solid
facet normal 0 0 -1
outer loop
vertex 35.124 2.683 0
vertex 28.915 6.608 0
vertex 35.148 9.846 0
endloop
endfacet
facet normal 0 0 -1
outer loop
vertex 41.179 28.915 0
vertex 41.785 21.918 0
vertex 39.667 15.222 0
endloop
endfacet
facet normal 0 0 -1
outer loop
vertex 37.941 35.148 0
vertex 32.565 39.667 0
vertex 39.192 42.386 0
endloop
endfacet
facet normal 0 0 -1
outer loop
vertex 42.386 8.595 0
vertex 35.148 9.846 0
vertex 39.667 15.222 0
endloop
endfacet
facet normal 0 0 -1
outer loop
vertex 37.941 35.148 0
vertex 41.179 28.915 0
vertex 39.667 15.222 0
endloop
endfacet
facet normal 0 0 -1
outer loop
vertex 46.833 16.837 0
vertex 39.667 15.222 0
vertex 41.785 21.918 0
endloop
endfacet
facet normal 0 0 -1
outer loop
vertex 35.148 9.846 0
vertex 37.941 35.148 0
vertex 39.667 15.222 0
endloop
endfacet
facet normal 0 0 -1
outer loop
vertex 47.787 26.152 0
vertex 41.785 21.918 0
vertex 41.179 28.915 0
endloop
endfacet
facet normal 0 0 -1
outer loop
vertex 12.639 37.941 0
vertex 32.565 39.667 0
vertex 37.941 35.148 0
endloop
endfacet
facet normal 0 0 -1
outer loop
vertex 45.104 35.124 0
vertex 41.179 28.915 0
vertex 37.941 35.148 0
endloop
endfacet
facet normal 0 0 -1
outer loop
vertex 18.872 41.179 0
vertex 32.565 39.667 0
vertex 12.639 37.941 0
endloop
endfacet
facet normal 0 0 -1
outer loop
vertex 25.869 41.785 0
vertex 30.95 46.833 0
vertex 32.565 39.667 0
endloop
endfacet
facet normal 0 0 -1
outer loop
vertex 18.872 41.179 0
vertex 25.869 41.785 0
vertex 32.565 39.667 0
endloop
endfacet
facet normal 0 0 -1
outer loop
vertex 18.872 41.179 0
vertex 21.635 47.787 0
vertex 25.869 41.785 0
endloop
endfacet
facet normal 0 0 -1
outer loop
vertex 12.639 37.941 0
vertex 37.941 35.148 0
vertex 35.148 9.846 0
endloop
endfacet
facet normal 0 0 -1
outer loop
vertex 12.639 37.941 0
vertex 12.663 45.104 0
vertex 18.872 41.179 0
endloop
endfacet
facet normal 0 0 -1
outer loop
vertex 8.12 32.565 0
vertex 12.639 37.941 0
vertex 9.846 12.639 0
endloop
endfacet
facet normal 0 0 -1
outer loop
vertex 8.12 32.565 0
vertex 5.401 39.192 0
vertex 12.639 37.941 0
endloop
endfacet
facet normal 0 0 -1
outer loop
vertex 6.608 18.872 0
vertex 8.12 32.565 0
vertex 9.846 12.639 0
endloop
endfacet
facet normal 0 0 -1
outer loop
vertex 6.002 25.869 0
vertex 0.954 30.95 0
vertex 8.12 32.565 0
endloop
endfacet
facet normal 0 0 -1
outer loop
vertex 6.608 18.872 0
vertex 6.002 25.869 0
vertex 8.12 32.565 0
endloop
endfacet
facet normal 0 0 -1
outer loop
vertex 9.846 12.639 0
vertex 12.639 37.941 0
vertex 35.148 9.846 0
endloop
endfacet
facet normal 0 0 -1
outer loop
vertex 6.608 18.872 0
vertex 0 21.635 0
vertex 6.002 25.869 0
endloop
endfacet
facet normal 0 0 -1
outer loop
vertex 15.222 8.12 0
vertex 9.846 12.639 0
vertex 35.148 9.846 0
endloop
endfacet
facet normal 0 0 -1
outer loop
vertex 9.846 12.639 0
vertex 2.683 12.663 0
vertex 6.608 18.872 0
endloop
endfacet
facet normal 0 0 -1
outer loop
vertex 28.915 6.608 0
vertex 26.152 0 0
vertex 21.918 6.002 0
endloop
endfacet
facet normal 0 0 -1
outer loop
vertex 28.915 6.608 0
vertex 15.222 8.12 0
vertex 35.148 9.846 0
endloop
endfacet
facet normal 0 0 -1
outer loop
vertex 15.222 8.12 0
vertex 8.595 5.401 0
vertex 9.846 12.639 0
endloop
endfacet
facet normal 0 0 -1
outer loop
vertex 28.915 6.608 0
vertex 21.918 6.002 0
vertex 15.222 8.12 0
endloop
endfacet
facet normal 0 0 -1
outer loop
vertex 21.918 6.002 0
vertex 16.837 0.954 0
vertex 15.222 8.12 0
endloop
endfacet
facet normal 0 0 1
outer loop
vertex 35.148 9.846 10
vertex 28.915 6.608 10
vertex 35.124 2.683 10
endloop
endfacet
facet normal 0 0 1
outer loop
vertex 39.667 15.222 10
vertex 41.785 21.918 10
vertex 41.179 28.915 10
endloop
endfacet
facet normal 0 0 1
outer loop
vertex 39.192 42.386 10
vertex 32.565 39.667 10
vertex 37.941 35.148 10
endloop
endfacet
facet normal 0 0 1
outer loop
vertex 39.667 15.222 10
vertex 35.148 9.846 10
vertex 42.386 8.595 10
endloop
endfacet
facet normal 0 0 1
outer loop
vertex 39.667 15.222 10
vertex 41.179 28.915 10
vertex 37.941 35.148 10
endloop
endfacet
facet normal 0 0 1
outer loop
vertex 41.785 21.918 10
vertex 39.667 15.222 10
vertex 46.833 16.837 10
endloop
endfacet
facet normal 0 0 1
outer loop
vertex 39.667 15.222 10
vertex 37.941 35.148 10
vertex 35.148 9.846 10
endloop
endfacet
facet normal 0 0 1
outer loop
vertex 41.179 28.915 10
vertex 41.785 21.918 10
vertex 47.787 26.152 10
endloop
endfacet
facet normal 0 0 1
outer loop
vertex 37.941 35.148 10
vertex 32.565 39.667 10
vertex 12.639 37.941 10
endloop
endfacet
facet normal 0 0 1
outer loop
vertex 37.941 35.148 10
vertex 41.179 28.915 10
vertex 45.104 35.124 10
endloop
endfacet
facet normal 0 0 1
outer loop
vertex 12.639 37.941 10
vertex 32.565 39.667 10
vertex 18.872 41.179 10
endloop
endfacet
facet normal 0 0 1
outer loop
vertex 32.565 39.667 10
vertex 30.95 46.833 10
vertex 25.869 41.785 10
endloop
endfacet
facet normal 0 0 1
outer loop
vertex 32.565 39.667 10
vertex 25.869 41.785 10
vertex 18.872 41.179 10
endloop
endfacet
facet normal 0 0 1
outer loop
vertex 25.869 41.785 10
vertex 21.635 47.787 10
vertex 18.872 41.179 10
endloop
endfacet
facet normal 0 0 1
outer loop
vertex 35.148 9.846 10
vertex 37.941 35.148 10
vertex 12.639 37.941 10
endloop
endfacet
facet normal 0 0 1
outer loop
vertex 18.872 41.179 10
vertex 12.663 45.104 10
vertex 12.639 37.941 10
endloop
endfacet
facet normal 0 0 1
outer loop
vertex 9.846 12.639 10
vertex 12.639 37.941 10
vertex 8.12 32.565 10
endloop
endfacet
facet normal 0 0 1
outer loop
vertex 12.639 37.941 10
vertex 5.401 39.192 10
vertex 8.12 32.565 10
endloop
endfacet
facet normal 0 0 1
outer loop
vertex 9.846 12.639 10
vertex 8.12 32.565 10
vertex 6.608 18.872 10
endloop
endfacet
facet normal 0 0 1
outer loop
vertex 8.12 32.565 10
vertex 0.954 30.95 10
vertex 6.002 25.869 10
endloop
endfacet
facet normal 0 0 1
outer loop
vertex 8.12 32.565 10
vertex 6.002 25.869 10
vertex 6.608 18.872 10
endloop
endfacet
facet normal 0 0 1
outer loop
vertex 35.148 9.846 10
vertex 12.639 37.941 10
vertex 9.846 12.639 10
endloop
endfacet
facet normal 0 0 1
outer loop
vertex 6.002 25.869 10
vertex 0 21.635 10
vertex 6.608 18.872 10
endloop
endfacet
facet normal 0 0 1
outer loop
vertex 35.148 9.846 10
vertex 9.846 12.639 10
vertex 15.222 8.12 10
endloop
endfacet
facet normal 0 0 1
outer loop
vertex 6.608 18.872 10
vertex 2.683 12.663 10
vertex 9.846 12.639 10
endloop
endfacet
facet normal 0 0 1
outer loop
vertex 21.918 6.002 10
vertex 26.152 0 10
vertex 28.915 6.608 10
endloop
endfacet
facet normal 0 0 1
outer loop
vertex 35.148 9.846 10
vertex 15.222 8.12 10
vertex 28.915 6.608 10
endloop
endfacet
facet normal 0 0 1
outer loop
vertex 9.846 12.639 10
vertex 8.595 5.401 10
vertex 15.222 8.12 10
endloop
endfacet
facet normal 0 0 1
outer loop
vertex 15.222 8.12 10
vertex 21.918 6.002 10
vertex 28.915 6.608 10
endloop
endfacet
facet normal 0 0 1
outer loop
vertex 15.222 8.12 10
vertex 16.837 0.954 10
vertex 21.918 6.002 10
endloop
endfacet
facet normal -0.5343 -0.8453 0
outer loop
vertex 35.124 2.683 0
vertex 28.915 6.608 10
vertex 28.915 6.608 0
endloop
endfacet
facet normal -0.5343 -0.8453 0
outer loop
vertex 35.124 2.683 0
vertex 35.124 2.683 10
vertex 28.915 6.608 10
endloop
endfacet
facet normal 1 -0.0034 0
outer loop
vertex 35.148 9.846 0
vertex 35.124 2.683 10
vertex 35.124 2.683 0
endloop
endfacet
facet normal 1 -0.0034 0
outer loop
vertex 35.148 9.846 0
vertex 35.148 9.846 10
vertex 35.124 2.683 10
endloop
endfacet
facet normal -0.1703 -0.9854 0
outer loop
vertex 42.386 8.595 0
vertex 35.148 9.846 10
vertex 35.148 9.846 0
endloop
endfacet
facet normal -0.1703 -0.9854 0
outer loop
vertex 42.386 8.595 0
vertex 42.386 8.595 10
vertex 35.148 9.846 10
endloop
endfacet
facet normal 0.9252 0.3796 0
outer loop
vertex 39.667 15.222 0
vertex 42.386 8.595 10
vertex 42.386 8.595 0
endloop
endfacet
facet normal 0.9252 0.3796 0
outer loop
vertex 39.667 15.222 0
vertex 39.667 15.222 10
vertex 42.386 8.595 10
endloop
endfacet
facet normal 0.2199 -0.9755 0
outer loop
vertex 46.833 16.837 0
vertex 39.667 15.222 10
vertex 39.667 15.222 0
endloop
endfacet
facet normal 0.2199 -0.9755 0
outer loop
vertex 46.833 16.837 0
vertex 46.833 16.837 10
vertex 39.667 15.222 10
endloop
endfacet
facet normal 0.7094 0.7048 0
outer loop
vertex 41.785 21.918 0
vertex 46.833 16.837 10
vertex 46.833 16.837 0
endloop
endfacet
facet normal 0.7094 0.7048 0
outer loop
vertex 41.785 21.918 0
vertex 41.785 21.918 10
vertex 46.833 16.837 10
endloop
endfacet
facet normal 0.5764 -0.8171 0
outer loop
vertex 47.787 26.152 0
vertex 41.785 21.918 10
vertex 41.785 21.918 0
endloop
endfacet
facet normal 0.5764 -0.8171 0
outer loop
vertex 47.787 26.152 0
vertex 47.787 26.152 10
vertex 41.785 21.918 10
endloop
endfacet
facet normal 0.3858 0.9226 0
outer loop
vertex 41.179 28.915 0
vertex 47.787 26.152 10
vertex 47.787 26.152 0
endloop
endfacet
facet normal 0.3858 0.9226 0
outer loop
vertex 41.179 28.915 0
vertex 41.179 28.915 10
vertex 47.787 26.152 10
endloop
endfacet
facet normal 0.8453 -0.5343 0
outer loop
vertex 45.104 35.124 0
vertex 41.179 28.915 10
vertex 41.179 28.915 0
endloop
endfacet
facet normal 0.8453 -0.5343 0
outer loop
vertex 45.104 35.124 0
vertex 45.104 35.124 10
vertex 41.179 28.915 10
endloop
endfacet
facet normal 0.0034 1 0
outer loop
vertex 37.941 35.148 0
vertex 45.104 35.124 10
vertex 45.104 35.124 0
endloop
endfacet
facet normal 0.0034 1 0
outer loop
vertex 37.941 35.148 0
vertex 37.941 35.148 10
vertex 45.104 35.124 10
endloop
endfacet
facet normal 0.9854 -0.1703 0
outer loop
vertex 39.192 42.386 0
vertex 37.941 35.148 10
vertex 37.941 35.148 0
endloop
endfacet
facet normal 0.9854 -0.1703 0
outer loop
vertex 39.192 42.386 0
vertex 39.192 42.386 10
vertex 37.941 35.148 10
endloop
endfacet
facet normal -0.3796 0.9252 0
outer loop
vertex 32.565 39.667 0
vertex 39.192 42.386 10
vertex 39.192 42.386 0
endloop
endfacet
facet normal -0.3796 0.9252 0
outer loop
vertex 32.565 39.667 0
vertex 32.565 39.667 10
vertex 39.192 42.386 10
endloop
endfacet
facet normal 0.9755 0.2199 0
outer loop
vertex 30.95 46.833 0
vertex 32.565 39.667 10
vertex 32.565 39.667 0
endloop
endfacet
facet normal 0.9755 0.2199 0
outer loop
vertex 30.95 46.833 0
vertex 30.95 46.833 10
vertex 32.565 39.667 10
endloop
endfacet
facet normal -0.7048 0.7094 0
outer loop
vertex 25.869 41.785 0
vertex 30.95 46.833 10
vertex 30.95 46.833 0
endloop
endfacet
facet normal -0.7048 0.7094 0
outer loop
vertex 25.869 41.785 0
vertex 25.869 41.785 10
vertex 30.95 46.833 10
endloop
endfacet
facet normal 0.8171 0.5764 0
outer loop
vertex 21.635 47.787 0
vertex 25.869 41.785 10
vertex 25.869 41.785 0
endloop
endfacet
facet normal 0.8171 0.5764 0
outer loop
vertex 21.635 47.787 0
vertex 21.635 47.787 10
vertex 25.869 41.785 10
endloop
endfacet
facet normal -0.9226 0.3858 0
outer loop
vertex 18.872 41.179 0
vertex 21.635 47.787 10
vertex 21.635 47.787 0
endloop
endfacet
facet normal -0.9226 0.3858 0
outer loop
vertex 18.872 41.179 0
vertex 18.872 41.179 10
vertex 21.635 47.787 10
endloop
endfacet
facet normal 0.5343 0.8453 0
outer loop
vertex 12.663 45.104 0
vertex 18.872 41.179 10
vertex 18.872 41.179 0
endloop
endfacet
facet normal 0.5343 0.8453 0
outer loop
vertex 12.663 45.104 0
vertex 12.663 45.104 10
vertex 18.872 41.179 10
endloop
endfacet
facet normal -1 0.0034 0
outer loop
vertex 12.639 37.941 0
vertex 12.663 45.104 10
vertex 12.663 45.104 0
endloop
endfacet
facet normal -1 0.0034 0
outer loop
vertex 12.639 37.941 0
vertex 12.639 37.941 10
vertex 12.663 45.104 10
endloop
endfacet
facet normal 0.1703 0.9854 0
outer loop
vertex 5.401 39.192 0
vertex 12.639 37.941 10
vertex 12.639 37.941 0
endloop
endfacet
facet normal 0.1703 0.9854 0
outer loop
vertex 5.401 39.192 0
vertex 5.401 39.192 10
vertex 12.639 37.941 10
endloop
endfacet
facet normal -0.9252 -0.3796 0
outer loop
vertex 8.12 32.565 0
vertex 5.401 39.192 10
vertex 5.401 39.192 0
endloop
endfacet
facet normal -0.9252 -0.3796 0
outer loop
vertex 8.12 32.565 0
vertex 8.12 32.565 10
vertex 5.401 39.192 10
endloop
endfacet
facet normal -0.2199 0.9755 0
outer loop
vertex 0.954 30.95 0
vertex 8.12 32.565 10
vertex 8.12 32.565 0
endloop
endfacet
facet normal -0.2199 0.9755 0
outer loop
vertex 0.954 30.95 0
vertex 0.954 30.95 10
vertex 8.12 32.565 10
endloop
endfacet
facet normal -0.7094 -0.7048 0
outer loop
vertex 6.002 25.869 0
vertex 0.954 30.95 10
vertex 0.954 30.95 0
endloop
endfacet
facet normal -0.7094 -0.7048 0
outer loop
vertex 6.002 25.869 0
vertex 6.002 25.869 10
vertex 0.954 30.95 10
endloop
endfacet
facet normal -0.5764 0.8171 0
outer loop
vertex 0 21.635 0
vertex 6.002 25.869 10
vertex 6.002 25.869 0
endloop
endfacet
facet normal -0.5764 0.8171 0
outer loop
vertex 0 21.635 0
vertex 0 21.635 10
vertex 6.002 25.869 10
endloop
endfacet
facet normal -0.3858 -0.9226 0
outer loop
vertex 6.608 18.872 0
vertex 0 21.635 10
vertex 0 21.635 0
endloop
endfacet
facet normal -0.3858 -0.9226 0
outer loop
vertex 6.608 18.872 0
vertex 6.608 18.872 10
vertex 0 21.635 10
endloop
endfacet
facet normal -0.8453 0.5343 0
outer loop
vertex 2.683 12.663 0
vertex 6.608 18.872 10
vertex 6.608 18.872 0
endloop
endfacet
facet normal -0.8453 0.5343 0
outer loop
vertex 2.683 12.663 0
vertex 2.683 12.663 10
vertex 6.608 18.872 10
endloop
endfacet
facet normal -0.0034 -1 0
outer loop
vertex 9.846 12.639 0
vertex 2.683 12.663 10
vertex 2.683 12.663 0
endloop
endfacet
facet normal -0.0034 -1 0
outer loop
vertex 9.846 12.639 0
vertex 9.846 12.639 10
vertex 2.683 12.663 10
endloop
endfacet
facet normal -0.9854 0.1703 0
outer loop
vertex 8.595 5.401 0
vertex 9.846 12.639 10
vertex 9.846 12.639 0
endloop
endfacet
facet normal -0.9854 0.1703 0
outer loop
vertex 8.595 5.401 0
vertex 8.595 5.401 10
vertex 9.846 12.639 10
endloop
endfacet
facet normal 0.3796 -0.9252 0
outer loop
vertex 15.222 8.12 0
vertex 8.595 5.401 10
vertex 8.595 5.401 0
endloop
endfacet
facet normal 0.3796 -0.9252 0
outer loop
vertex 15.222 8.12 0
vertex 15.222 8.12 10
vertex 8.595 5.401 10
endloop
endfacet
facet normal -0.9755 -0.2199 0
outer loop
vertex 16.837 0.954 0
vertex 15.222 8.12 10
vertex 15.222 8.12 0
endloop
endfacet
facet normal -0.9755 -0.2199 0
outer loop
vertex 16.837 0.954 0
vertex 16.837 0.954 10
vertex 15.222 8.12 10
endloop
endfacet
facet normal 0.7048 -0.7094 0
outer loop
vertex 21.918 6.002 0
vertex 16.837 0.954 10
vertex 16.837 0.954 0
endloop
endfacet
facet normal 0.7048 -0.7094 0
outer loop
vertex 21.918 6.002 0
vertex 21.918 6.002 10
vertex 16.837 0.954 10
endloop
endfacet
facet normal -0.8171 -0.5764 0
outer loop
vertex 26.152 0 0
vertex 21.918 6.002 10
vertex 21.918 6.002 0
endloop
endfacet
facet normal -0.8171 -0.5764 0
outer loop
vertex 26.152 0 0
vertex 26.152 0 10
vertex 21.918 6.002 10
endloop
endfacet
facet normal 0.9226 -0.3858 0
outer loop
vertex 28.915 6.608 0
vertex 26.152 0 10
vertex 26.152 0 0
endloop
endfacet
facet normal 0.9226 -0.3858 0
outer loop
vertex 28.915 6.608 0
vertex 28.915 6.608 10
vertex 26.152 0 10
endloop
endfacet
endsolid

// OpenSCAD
$fn = 32;

// ----------------------------------------------------------------------
// Chain sprocket: 16 teeth, 18 mm root radius
// ----------------------------------------------------------------------

// --- parameters (mm) ---
profile_height = 10;      // extrusion height
profile_points = 32;      // points of the closed outline

profile = [[41.785, 21.918], [47.787, 26.152], [41.179, 28.915], [45.104, 35.124], [37.941, 35.148], [39.192, 42.386], [32.565, 39.667], [30.95, 46.833], [25.869, 41.785], [21.635, 47.787], [18.872, 41.179], [12.663, 45.104], [12.639, 37.941], [5.401, 39.192], [8.12, 32.565], [0.954, 30.95], [6.002, 25.869], [0, 21.635], [6.608, 18.872], [2.683, 12.663], [9.846, 12.639], [8.595, 5.401], [15.222, 8.12], [16.837, 0.954], [21.918, 6.002], [26.152, 0], [28.915, 6.608], [35.124, 2.683], [35.148, 9.846], [42.386, 8.595], [39.667, 15.222], [46.833, 16.837]];  // single closed polygon, 32 points, counter clockwise

// --- the one profile operation ---
linear_extrude(height = profile_height) polygon(points = profile);
